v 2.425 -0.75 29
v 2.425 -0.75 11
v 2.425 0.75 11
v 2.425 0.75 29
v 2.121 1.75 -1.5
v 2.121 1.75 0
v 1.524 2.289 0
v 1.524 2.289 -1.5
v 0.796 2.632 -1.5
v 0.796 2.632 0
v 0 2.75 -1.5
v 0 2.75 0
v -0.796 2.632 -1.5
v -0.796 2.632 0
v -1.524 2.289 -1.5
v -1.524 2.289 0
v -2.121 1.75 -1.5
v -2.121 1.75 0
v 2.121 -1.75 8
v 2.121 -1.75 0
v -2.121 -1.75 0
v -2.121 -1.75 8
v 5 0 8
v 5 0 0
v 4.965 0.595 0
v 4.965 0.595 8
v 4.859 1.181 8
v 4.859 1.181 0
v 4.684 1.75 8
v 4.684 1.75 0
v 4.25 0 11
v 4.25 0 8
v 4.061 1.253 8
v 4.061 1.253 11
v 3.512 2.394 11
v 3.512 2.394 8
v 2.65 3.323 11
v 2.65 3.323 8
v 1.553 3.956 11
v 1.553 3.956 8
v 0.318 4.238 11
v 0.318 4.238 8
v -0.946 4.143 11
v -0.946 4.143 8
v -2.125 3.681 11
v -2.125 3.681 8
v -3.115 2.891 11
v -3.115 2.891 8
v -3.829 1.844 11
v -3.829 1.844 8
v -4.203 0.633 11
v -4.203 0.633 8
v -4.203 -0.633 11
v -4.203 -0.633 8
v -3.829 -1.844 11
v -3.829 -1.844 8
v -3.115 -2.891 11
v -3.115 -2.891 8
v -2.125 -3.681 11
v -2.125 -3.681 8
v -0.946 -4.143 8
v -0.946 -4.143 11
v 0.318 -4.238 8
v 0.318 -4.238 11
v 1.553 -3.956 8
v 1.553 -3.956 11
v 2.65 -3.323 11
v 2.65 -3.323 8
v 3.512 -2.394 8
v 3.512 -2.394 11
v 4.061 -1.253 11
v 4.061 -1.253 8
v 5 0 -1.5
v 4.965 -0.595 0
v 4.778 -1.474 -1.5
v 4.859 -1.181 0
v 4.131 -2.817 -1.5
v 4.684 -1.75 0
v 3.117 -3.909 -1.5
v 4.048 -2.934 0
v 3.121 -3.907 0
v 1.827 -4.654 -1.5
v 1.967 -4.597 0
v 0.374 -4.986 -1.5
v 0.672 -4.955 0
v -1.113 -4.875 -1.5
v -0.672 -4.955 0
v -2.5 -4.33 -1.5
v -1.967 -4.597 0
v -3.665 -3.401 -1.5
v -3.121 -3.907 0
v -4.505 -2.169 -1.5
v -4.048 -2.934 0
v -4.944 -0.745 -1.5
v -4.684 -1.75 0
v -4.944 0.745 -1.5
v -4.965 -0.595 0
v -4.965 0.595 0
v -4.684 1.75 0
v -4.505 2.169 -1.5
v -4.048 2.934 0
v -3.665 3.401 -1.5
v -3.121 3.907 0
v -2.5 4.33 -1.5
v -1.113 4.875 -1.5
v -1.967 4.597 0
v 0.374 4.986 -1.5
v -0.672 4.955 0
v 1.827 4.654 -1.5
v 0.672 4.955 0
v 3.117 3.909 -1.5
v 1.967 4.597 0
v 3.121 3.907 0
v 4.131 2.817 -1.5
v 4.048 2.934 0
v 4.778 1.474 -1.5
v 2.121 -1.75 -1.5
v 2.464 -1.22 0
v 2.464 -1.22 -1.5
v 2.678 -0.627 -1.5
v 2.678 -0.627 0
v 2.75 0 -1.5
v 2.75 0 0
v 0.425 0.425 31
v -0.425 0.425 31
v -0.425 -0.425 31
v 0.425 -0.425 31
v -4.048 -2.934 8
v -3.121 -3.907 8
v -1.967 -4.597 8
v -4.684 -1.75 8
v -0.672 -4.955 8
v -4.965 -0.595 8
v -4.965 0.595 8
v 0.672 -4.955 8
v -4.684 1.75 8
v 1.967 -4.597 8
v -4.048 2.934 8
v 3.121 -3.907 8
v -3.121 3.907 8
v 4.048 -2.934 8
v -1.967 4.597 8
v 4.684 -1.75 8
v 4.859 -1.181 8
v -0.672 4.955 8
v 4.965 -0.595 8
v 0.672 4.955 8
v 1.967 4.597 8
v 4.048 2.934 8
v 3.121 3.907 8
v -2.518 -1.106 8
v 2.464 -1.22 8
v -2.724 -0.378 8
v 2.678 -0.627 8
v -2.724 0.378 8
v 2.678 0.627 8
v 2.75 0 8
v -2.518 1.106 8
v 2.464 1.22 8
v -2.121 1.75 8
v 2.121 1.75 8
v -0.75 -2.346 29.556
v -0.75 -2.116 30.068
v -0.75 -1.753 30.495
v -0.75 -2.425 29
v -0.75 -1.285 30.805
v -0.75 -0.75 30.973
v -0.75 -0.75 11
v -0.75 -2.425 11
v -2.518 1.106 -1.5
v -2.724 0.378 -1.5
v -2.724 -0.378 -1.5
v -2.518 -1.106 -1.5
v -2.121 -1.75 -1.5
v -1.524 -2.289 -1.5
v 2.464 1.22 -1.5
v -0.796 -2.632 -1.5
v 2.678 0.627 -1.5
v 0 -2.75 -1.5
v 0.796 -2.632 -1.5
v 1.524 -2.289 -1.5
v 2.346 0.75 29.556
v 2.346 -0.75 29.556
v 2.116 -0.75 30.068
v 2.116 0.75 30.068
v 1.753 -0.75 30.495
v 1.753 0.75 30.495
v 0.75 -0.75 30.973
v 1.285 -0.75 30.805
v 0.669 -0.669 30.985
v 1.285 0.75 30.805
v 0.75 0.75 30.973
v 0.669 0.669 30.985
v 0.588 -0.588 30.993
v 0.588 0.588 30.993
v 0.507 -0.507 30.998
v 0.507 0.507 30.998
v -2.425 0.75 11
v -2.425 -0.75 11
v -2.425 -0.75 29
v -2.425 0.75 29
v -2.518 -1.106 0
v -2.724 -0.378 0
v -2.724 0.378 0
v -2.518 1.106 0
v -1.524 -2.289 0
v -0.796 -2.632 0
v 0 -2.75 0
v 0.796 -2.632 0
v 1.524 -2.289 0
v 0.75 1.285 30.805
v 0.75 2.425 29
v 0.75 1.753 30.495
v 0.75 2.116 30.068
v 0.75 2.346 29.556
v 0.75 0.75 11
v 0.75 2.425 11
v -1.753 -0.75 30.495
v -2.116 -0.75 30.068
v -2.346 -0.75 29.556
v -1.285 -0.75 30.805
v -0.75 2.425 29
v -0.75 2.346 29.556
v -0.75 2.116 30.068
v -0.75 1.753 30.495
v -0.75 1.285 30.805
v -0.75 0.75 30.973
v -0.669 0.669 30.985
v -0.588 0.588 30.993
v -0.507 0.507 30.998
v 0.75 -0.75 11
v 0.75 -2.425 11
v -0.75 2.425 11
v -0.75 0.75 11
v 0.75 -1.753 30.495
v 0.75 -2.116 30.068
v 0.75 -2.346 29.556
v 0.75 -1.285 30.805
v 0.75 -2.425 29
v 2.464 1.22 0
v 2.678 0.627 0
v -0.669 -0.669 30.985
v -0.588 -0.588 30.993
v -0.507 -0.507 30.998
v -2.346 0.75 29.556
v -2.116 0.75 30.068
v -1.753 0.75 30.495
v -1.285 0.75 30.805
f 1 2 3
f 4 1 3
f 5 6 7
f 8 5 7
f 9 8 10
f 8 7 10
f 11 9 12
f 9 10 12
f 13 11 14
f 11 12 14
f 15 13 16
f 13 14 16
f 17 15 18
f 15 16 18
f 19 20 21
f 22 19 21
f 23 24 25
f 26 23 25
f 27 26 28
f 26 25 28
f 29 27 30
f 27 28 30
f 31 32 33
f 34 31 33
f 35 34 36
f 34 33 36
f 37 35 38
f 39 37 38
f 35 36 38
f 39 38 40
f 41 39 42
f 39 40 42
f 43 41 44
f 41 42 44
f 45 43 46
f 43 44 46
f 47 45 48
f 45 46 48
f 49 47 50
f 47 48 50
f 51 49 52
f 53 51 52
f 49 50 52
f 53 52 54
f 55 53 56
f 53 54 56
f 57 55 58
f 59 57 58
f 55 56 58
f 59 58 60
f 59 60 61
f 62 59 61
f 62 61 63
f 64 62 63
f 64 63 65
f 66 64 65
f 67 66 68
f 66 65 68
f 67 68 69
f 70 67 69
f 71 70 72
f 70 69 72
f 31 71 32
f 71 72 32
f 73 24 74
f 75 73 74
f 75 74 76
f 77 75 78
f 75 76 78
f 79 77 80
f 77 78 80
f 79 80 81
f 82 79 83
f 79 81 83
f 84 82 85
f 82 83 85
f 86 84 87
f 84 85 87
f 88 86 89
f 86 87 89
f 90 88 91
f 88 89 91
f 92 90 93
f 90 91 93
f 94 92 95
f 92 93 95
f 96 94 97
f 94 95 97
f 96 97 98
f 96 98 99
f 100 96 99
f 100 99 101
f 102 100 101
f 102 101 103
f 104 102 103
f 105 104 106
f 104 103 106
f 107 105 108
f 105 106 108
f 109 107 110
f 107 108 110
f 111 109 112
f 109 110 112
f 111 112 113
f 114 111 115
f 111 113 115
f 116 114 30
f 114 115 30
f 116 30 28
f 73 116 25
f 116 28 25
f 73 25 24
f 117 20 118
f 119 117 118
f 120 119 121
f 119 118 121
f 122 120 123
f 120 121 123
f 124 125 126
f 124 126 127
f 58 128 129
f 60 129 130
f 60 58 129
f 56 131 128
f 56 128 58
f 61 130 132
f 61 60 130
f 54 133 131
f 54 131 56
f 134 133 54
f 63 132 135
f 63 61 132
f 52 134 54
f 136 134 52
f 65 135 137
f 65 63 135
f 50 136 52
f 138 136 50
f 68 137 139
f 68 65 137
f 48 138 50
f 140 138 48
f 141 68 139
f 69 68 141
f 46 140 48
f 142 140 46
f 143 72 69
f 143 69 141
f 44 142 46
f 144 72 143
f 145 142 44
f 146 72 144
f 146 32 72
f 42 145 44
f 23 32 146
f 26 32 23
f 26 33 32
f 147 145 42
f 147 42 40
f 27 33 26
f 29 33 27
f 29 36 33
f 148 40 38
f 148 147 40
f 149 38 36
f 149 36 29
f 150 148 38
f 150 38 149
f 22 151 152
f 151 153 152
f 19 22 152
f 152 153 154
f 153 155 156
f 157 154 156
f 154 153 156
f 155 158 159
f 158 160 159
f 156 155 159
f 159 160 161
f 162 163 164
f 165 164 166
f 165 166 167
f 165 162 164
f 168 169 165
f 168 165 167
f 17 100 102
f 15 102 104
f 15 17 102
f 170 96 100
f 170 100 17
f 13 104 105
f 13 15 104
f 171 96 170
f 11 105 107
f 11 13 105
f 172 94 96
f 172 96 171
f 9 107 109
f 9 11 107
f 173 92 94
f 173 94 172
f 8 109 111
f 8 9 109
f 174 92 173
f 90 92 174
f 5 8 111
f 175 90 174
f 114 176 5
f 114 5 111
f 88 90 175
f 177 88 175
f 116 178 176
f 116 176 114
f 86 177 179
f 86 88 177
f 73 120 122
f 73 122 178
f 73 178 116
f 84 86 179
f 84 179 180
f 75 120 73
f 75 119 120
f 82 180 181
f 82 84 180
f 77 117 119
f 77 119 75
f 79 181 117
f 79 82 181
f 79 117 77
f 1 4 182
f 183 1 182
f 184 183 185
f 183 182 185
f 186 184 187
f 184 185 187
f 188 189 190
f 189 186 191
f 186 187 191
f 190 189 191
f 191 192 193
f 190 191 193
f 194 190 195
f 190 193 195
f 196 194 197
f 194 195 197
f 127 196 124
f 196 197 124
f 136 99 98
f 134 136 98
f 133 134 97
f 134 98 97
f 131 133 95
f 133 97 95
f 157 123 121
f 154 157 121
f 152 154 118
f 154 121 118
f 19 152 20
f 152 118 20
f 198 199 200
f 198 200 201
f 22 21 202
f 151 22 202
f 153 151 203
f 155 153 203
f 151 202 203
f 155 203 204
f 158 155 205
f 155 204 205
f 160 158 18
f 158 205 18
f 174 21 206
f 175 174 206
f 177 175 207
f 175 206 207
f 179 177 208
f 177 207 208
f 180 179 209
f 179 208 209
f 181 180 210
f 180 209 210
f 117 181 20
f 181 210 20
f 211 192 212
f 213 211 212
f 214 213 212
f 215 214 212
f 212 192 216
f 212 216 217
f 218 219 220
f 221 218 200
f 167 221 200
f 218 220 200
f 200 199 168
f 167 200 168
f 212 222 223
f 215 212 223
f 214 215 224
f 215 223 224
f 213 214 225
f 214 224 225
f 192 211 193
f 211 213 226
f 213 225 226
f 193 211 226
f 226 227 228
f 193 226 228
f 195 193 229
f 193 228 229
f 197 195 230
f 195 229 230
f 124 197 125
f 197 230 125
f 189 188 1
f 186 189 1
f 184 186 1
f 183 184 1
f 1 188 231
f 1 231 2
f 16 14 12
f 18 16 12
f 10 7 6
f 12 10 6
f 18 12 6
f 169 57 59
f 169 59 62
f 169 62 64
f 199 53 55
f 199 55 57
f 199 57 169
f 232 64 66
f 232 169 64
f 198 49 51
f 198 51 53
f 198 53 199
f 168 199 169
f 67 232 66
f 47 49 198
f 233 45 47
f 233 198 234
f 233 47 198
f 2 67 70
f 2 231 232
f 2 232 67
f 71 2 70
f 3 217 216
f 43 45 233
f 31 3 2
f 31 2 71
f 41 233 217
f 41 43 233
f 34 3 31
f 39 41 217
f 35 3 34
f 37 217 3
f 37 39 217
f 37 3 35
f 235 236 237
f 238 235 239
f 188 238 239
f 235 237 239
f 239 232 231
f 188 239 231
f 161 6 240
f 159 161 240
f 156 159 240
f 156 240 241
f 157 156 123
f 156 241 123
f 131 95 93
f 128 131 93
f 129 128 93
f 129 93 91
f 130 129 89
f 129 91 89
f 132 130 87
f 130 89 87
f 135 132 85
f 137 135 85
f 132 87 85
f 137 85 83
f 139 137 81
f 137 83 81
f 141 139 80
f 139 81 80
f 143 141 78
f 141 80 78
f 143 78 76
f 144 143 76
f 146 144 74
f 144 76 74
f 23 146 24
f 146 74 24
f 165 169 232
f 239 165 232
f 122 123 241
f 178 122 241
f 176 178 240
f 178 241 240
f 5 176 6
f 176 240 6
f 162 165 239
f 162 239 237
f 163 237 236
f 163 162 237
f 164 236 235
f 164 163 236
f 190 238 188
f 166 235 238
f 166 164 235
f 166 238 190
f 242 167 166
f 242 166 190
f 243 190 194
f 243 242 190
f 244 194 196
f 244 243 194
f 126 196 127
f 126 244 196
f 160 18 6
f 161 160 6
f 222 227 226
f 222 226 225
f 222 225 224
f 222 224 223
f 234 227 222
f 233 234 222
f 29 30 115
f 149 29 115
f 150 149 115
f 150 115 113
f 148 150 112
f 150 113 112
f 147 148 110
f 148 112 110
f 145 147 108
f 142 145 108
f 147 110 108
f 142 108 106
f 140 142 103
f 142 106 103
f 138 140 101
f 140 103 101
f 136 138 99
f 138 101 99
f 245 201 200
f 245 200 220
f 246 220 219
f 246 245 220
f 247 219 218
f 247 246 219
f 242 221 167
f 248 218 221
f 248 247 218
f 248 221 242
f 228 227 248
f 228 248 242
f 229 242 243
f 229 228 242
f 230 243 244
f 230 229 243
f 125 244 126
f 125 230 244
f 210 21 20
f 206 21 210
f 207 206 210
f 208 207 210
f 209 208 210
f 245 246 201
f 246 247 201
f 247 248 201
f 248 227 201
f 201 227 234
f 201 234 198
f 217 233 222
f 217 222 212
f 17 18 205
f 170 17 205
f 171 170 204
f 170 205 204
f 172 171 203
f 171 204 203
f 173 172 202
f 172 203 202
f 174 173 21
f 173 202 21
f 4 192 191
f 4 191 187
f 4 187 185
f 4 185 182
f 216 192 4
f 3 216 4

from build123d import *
from build123d import SkipClean  # not in build123d's __all__

# Parameters (mm, degrees)
F1_DEPTH    = 8
F2_R        = 4.25
F3_DEPTH    = 3
F4_W        = 1.675
F4_H        = 1.5
F4_W_2      = 1.5
F4_H_2      = 1.675
F5_DEPTH    = 20
F6_T1_DEPTH = 11.5
F6_T3_DEPTH = 11.5
F7_R        = 5
F8_DEPTH    = 1.5


# Not quite as in the source:
# - a fillet or chamfer that OpenCascade refuses, or shapes differently, is made with other operations: its cross-section is extruded or revolved along the edge and cut away or added


with BuildPart() as f1:
    # F0 (on Top) → F1 (new body)
    with BuildSketch(Plane.XY):
        with BuildLine():
            ThreePointArc((4.6837484988, -1.75), (4.9203019467, -0.8891730726), (5, 0))
            ThreePointArc((5, 0), (4.9203019467, 0.8891730726), (4.6837484988, 1.75))
            Line((4.6837484988, 1.75), (2.1213203436, 1.75))
            ThreePointArc((2.1213203436, 1.75), (2.5880621075, 0.9297497123), (2.75, 0))
            ThreePointArc((2.75, 0), (2.5880621075, -0.9297497123), (2.1213203436, -1.75))
            Line((2.1213203436, -1.75), (4.6837484988, -1.75))
        make_face()
        with BuildLine():
            Line((2.1213203436, 1.75), (4.6837484988, 1.75))
            ThreePointArc((4.6837484988, 1.75), (0, 5), (-4.6837484988, 1.75))
            Line((-4.6837484988, 1.75), (-2.1213203436, 1.75))
            ThreePointArc((-2.1213203436, 1.75), (0, 2.75), (2.1213203436, 1.75))
        make_face()
        with BuildLine():
            ThreePointArc((-4.6837484988, -1.75), (0, -5), (4.6837484988, -1.75))
            Line((4.6837484988, -1.75), (2.1213203436, -1.75))
            ThreePointArc((2.1213203436, -1.75), (0, -2.75), (-2.1213203436, -1.75))
            Line((-2.1213203436, -1.75), (-4.6837484988, -1.75))
        make_face()
        with BuildLine():
            Line((-2.1213203436, 1.75), (-4.6837484988, 1.75))
            ThreePointArc((-4.6837484988, 1.75), (-5, 0), (-4.6837484988, -1.75))
            Line((-4.6837484988, -1.75), (-2.1213203436, -1.75))
            ThreePointArc((-2.1213203436, -1.75), (-2.75, 0), (-2.1213203436, 1.75))
        make_face()
        with BuildLine():
            Line((-2.1213203436, 1.75), (2.1213203436, 1.75))
            ThreePointArc((2.1213203436, 1.75), (0, 2.75), (-2.1213203436, 1.75))
        make_face()
        with BuildLine():
            ThreePointArc((-2.1213203436, -1.75), (0, -2.75), (2.1213203436, -1.75))
            Line((2.1213203436, -1.75), (-2.1213203436, -1.75))
        make_face()
    extrude(amount=F1_DEPTH)

    # F2 (on face) → F3 (join)
    with BuildSketch(Plane.XY.offset(8)):
        Circle(F2_R)
    extrude(amount=F3_DEPTH)

    # F4 (on face) → F5 (join)
    with BuildSketch(Plane.XY.offset(11)):
        with Locations((-1.5875, 0)):
            Rectangle(F4_W, F4_H)
        Rectangle(F4_W_2, F4_H)
        with Locations((0, 1.5875)):
            Rectangle(F4_W_2, F4_H_2)
        with Locations((1.5875, 0)):
            Rectangle(F4_W, F4_H)
        with Locations((0, -1.5875)):
            Rectangle(F4_W_2, F4_H_2)
    extrude(amount=F5_DEPTH)

    # F6: fillet of radius 2 on 4 edges, made by hand

    # F6_s2 → F6_t1 (cut)
    with BuildSketch(Plane.YZ.offset(-5.75)):
        with BuildLine():
            ThreePointArc((2.425, 29), (1.8392135624, 30.4142135624), (0.425, 31))
            Line((0.425, 31), (2.425, 31))
            Line((2.425, 31), (2.425, 29))
        make_face()
        with BuildLine():
            ThreePointArc((-2.425, 29), (-1.8392135624, 30.4142135624), (-0.425, 31))
            Line((-0.425, 31), (-2.425, 31))
            Line((-2.425, 31), (-2.425, 29))
        make_face()
    extrude(amount=F6_T1_DEPTH, mode=Mode.SUBTRACT)

    # F6_s4 → F6_t3 (cut)
    with BuildSketch(Plane.XZ.offset(-5.75)):
        with BuildLine():
            ThreePointArc((2.425, 29), (1.8392135624, 30.4142135624), (0.425, 31))
            Line((0.425, 31), (2.425, 31))
            Line((2.425, 31), (2.425, 29))
        make_face()
        with BuildLine():
            ThreePointArc((-2.425, 29), (-1.8392135624, 30.4142135624), (-0.425, 31))
            Line((-0.425, 31), (-2.425, 31))
            Line((-2.425, 31), (-2.425, 29))
        make_face()
    extrude(amount=F6_T3_DEPTH, mode=Mode.SUBTRACT)

    # F7 (on face) → F8 (join)
    with BuildSketch(Plane(origin=(0, 0, 0), x_dir=(1, 0, 0), z_dir=(0, 0, -1))):
        Circle(F7_R)
        with BuildLine():
            ThreePointArc((2.1213203436, 1.75), (2.5880621075, 0.9297497123), (2.75, 0))
            ThreePointArc((2.75, 0), (2.5880621075, -0.9297497123), (2.1213203436, -1.75))
            ThreePointArc((2.1213203436, -1.75), (0, -2.75), (-2.1213203436, -1.75))
            ThreePointArc((-2.1213203436, -1.75), (-2.75, 0), (-2.1213203436, 1.75))
            ThreePointArc((-2.1213203436, 1.75), (0, 2.75), (2.1213203436, 1.75))
        make_face(mode=Mode.SUBTRACT)
    with SkipClean():  # cleaning this boolean's faces spoils the solid; the shape is the same uncleaned
        extrude(amount=F8_DEPTH)


solid = f1.part
